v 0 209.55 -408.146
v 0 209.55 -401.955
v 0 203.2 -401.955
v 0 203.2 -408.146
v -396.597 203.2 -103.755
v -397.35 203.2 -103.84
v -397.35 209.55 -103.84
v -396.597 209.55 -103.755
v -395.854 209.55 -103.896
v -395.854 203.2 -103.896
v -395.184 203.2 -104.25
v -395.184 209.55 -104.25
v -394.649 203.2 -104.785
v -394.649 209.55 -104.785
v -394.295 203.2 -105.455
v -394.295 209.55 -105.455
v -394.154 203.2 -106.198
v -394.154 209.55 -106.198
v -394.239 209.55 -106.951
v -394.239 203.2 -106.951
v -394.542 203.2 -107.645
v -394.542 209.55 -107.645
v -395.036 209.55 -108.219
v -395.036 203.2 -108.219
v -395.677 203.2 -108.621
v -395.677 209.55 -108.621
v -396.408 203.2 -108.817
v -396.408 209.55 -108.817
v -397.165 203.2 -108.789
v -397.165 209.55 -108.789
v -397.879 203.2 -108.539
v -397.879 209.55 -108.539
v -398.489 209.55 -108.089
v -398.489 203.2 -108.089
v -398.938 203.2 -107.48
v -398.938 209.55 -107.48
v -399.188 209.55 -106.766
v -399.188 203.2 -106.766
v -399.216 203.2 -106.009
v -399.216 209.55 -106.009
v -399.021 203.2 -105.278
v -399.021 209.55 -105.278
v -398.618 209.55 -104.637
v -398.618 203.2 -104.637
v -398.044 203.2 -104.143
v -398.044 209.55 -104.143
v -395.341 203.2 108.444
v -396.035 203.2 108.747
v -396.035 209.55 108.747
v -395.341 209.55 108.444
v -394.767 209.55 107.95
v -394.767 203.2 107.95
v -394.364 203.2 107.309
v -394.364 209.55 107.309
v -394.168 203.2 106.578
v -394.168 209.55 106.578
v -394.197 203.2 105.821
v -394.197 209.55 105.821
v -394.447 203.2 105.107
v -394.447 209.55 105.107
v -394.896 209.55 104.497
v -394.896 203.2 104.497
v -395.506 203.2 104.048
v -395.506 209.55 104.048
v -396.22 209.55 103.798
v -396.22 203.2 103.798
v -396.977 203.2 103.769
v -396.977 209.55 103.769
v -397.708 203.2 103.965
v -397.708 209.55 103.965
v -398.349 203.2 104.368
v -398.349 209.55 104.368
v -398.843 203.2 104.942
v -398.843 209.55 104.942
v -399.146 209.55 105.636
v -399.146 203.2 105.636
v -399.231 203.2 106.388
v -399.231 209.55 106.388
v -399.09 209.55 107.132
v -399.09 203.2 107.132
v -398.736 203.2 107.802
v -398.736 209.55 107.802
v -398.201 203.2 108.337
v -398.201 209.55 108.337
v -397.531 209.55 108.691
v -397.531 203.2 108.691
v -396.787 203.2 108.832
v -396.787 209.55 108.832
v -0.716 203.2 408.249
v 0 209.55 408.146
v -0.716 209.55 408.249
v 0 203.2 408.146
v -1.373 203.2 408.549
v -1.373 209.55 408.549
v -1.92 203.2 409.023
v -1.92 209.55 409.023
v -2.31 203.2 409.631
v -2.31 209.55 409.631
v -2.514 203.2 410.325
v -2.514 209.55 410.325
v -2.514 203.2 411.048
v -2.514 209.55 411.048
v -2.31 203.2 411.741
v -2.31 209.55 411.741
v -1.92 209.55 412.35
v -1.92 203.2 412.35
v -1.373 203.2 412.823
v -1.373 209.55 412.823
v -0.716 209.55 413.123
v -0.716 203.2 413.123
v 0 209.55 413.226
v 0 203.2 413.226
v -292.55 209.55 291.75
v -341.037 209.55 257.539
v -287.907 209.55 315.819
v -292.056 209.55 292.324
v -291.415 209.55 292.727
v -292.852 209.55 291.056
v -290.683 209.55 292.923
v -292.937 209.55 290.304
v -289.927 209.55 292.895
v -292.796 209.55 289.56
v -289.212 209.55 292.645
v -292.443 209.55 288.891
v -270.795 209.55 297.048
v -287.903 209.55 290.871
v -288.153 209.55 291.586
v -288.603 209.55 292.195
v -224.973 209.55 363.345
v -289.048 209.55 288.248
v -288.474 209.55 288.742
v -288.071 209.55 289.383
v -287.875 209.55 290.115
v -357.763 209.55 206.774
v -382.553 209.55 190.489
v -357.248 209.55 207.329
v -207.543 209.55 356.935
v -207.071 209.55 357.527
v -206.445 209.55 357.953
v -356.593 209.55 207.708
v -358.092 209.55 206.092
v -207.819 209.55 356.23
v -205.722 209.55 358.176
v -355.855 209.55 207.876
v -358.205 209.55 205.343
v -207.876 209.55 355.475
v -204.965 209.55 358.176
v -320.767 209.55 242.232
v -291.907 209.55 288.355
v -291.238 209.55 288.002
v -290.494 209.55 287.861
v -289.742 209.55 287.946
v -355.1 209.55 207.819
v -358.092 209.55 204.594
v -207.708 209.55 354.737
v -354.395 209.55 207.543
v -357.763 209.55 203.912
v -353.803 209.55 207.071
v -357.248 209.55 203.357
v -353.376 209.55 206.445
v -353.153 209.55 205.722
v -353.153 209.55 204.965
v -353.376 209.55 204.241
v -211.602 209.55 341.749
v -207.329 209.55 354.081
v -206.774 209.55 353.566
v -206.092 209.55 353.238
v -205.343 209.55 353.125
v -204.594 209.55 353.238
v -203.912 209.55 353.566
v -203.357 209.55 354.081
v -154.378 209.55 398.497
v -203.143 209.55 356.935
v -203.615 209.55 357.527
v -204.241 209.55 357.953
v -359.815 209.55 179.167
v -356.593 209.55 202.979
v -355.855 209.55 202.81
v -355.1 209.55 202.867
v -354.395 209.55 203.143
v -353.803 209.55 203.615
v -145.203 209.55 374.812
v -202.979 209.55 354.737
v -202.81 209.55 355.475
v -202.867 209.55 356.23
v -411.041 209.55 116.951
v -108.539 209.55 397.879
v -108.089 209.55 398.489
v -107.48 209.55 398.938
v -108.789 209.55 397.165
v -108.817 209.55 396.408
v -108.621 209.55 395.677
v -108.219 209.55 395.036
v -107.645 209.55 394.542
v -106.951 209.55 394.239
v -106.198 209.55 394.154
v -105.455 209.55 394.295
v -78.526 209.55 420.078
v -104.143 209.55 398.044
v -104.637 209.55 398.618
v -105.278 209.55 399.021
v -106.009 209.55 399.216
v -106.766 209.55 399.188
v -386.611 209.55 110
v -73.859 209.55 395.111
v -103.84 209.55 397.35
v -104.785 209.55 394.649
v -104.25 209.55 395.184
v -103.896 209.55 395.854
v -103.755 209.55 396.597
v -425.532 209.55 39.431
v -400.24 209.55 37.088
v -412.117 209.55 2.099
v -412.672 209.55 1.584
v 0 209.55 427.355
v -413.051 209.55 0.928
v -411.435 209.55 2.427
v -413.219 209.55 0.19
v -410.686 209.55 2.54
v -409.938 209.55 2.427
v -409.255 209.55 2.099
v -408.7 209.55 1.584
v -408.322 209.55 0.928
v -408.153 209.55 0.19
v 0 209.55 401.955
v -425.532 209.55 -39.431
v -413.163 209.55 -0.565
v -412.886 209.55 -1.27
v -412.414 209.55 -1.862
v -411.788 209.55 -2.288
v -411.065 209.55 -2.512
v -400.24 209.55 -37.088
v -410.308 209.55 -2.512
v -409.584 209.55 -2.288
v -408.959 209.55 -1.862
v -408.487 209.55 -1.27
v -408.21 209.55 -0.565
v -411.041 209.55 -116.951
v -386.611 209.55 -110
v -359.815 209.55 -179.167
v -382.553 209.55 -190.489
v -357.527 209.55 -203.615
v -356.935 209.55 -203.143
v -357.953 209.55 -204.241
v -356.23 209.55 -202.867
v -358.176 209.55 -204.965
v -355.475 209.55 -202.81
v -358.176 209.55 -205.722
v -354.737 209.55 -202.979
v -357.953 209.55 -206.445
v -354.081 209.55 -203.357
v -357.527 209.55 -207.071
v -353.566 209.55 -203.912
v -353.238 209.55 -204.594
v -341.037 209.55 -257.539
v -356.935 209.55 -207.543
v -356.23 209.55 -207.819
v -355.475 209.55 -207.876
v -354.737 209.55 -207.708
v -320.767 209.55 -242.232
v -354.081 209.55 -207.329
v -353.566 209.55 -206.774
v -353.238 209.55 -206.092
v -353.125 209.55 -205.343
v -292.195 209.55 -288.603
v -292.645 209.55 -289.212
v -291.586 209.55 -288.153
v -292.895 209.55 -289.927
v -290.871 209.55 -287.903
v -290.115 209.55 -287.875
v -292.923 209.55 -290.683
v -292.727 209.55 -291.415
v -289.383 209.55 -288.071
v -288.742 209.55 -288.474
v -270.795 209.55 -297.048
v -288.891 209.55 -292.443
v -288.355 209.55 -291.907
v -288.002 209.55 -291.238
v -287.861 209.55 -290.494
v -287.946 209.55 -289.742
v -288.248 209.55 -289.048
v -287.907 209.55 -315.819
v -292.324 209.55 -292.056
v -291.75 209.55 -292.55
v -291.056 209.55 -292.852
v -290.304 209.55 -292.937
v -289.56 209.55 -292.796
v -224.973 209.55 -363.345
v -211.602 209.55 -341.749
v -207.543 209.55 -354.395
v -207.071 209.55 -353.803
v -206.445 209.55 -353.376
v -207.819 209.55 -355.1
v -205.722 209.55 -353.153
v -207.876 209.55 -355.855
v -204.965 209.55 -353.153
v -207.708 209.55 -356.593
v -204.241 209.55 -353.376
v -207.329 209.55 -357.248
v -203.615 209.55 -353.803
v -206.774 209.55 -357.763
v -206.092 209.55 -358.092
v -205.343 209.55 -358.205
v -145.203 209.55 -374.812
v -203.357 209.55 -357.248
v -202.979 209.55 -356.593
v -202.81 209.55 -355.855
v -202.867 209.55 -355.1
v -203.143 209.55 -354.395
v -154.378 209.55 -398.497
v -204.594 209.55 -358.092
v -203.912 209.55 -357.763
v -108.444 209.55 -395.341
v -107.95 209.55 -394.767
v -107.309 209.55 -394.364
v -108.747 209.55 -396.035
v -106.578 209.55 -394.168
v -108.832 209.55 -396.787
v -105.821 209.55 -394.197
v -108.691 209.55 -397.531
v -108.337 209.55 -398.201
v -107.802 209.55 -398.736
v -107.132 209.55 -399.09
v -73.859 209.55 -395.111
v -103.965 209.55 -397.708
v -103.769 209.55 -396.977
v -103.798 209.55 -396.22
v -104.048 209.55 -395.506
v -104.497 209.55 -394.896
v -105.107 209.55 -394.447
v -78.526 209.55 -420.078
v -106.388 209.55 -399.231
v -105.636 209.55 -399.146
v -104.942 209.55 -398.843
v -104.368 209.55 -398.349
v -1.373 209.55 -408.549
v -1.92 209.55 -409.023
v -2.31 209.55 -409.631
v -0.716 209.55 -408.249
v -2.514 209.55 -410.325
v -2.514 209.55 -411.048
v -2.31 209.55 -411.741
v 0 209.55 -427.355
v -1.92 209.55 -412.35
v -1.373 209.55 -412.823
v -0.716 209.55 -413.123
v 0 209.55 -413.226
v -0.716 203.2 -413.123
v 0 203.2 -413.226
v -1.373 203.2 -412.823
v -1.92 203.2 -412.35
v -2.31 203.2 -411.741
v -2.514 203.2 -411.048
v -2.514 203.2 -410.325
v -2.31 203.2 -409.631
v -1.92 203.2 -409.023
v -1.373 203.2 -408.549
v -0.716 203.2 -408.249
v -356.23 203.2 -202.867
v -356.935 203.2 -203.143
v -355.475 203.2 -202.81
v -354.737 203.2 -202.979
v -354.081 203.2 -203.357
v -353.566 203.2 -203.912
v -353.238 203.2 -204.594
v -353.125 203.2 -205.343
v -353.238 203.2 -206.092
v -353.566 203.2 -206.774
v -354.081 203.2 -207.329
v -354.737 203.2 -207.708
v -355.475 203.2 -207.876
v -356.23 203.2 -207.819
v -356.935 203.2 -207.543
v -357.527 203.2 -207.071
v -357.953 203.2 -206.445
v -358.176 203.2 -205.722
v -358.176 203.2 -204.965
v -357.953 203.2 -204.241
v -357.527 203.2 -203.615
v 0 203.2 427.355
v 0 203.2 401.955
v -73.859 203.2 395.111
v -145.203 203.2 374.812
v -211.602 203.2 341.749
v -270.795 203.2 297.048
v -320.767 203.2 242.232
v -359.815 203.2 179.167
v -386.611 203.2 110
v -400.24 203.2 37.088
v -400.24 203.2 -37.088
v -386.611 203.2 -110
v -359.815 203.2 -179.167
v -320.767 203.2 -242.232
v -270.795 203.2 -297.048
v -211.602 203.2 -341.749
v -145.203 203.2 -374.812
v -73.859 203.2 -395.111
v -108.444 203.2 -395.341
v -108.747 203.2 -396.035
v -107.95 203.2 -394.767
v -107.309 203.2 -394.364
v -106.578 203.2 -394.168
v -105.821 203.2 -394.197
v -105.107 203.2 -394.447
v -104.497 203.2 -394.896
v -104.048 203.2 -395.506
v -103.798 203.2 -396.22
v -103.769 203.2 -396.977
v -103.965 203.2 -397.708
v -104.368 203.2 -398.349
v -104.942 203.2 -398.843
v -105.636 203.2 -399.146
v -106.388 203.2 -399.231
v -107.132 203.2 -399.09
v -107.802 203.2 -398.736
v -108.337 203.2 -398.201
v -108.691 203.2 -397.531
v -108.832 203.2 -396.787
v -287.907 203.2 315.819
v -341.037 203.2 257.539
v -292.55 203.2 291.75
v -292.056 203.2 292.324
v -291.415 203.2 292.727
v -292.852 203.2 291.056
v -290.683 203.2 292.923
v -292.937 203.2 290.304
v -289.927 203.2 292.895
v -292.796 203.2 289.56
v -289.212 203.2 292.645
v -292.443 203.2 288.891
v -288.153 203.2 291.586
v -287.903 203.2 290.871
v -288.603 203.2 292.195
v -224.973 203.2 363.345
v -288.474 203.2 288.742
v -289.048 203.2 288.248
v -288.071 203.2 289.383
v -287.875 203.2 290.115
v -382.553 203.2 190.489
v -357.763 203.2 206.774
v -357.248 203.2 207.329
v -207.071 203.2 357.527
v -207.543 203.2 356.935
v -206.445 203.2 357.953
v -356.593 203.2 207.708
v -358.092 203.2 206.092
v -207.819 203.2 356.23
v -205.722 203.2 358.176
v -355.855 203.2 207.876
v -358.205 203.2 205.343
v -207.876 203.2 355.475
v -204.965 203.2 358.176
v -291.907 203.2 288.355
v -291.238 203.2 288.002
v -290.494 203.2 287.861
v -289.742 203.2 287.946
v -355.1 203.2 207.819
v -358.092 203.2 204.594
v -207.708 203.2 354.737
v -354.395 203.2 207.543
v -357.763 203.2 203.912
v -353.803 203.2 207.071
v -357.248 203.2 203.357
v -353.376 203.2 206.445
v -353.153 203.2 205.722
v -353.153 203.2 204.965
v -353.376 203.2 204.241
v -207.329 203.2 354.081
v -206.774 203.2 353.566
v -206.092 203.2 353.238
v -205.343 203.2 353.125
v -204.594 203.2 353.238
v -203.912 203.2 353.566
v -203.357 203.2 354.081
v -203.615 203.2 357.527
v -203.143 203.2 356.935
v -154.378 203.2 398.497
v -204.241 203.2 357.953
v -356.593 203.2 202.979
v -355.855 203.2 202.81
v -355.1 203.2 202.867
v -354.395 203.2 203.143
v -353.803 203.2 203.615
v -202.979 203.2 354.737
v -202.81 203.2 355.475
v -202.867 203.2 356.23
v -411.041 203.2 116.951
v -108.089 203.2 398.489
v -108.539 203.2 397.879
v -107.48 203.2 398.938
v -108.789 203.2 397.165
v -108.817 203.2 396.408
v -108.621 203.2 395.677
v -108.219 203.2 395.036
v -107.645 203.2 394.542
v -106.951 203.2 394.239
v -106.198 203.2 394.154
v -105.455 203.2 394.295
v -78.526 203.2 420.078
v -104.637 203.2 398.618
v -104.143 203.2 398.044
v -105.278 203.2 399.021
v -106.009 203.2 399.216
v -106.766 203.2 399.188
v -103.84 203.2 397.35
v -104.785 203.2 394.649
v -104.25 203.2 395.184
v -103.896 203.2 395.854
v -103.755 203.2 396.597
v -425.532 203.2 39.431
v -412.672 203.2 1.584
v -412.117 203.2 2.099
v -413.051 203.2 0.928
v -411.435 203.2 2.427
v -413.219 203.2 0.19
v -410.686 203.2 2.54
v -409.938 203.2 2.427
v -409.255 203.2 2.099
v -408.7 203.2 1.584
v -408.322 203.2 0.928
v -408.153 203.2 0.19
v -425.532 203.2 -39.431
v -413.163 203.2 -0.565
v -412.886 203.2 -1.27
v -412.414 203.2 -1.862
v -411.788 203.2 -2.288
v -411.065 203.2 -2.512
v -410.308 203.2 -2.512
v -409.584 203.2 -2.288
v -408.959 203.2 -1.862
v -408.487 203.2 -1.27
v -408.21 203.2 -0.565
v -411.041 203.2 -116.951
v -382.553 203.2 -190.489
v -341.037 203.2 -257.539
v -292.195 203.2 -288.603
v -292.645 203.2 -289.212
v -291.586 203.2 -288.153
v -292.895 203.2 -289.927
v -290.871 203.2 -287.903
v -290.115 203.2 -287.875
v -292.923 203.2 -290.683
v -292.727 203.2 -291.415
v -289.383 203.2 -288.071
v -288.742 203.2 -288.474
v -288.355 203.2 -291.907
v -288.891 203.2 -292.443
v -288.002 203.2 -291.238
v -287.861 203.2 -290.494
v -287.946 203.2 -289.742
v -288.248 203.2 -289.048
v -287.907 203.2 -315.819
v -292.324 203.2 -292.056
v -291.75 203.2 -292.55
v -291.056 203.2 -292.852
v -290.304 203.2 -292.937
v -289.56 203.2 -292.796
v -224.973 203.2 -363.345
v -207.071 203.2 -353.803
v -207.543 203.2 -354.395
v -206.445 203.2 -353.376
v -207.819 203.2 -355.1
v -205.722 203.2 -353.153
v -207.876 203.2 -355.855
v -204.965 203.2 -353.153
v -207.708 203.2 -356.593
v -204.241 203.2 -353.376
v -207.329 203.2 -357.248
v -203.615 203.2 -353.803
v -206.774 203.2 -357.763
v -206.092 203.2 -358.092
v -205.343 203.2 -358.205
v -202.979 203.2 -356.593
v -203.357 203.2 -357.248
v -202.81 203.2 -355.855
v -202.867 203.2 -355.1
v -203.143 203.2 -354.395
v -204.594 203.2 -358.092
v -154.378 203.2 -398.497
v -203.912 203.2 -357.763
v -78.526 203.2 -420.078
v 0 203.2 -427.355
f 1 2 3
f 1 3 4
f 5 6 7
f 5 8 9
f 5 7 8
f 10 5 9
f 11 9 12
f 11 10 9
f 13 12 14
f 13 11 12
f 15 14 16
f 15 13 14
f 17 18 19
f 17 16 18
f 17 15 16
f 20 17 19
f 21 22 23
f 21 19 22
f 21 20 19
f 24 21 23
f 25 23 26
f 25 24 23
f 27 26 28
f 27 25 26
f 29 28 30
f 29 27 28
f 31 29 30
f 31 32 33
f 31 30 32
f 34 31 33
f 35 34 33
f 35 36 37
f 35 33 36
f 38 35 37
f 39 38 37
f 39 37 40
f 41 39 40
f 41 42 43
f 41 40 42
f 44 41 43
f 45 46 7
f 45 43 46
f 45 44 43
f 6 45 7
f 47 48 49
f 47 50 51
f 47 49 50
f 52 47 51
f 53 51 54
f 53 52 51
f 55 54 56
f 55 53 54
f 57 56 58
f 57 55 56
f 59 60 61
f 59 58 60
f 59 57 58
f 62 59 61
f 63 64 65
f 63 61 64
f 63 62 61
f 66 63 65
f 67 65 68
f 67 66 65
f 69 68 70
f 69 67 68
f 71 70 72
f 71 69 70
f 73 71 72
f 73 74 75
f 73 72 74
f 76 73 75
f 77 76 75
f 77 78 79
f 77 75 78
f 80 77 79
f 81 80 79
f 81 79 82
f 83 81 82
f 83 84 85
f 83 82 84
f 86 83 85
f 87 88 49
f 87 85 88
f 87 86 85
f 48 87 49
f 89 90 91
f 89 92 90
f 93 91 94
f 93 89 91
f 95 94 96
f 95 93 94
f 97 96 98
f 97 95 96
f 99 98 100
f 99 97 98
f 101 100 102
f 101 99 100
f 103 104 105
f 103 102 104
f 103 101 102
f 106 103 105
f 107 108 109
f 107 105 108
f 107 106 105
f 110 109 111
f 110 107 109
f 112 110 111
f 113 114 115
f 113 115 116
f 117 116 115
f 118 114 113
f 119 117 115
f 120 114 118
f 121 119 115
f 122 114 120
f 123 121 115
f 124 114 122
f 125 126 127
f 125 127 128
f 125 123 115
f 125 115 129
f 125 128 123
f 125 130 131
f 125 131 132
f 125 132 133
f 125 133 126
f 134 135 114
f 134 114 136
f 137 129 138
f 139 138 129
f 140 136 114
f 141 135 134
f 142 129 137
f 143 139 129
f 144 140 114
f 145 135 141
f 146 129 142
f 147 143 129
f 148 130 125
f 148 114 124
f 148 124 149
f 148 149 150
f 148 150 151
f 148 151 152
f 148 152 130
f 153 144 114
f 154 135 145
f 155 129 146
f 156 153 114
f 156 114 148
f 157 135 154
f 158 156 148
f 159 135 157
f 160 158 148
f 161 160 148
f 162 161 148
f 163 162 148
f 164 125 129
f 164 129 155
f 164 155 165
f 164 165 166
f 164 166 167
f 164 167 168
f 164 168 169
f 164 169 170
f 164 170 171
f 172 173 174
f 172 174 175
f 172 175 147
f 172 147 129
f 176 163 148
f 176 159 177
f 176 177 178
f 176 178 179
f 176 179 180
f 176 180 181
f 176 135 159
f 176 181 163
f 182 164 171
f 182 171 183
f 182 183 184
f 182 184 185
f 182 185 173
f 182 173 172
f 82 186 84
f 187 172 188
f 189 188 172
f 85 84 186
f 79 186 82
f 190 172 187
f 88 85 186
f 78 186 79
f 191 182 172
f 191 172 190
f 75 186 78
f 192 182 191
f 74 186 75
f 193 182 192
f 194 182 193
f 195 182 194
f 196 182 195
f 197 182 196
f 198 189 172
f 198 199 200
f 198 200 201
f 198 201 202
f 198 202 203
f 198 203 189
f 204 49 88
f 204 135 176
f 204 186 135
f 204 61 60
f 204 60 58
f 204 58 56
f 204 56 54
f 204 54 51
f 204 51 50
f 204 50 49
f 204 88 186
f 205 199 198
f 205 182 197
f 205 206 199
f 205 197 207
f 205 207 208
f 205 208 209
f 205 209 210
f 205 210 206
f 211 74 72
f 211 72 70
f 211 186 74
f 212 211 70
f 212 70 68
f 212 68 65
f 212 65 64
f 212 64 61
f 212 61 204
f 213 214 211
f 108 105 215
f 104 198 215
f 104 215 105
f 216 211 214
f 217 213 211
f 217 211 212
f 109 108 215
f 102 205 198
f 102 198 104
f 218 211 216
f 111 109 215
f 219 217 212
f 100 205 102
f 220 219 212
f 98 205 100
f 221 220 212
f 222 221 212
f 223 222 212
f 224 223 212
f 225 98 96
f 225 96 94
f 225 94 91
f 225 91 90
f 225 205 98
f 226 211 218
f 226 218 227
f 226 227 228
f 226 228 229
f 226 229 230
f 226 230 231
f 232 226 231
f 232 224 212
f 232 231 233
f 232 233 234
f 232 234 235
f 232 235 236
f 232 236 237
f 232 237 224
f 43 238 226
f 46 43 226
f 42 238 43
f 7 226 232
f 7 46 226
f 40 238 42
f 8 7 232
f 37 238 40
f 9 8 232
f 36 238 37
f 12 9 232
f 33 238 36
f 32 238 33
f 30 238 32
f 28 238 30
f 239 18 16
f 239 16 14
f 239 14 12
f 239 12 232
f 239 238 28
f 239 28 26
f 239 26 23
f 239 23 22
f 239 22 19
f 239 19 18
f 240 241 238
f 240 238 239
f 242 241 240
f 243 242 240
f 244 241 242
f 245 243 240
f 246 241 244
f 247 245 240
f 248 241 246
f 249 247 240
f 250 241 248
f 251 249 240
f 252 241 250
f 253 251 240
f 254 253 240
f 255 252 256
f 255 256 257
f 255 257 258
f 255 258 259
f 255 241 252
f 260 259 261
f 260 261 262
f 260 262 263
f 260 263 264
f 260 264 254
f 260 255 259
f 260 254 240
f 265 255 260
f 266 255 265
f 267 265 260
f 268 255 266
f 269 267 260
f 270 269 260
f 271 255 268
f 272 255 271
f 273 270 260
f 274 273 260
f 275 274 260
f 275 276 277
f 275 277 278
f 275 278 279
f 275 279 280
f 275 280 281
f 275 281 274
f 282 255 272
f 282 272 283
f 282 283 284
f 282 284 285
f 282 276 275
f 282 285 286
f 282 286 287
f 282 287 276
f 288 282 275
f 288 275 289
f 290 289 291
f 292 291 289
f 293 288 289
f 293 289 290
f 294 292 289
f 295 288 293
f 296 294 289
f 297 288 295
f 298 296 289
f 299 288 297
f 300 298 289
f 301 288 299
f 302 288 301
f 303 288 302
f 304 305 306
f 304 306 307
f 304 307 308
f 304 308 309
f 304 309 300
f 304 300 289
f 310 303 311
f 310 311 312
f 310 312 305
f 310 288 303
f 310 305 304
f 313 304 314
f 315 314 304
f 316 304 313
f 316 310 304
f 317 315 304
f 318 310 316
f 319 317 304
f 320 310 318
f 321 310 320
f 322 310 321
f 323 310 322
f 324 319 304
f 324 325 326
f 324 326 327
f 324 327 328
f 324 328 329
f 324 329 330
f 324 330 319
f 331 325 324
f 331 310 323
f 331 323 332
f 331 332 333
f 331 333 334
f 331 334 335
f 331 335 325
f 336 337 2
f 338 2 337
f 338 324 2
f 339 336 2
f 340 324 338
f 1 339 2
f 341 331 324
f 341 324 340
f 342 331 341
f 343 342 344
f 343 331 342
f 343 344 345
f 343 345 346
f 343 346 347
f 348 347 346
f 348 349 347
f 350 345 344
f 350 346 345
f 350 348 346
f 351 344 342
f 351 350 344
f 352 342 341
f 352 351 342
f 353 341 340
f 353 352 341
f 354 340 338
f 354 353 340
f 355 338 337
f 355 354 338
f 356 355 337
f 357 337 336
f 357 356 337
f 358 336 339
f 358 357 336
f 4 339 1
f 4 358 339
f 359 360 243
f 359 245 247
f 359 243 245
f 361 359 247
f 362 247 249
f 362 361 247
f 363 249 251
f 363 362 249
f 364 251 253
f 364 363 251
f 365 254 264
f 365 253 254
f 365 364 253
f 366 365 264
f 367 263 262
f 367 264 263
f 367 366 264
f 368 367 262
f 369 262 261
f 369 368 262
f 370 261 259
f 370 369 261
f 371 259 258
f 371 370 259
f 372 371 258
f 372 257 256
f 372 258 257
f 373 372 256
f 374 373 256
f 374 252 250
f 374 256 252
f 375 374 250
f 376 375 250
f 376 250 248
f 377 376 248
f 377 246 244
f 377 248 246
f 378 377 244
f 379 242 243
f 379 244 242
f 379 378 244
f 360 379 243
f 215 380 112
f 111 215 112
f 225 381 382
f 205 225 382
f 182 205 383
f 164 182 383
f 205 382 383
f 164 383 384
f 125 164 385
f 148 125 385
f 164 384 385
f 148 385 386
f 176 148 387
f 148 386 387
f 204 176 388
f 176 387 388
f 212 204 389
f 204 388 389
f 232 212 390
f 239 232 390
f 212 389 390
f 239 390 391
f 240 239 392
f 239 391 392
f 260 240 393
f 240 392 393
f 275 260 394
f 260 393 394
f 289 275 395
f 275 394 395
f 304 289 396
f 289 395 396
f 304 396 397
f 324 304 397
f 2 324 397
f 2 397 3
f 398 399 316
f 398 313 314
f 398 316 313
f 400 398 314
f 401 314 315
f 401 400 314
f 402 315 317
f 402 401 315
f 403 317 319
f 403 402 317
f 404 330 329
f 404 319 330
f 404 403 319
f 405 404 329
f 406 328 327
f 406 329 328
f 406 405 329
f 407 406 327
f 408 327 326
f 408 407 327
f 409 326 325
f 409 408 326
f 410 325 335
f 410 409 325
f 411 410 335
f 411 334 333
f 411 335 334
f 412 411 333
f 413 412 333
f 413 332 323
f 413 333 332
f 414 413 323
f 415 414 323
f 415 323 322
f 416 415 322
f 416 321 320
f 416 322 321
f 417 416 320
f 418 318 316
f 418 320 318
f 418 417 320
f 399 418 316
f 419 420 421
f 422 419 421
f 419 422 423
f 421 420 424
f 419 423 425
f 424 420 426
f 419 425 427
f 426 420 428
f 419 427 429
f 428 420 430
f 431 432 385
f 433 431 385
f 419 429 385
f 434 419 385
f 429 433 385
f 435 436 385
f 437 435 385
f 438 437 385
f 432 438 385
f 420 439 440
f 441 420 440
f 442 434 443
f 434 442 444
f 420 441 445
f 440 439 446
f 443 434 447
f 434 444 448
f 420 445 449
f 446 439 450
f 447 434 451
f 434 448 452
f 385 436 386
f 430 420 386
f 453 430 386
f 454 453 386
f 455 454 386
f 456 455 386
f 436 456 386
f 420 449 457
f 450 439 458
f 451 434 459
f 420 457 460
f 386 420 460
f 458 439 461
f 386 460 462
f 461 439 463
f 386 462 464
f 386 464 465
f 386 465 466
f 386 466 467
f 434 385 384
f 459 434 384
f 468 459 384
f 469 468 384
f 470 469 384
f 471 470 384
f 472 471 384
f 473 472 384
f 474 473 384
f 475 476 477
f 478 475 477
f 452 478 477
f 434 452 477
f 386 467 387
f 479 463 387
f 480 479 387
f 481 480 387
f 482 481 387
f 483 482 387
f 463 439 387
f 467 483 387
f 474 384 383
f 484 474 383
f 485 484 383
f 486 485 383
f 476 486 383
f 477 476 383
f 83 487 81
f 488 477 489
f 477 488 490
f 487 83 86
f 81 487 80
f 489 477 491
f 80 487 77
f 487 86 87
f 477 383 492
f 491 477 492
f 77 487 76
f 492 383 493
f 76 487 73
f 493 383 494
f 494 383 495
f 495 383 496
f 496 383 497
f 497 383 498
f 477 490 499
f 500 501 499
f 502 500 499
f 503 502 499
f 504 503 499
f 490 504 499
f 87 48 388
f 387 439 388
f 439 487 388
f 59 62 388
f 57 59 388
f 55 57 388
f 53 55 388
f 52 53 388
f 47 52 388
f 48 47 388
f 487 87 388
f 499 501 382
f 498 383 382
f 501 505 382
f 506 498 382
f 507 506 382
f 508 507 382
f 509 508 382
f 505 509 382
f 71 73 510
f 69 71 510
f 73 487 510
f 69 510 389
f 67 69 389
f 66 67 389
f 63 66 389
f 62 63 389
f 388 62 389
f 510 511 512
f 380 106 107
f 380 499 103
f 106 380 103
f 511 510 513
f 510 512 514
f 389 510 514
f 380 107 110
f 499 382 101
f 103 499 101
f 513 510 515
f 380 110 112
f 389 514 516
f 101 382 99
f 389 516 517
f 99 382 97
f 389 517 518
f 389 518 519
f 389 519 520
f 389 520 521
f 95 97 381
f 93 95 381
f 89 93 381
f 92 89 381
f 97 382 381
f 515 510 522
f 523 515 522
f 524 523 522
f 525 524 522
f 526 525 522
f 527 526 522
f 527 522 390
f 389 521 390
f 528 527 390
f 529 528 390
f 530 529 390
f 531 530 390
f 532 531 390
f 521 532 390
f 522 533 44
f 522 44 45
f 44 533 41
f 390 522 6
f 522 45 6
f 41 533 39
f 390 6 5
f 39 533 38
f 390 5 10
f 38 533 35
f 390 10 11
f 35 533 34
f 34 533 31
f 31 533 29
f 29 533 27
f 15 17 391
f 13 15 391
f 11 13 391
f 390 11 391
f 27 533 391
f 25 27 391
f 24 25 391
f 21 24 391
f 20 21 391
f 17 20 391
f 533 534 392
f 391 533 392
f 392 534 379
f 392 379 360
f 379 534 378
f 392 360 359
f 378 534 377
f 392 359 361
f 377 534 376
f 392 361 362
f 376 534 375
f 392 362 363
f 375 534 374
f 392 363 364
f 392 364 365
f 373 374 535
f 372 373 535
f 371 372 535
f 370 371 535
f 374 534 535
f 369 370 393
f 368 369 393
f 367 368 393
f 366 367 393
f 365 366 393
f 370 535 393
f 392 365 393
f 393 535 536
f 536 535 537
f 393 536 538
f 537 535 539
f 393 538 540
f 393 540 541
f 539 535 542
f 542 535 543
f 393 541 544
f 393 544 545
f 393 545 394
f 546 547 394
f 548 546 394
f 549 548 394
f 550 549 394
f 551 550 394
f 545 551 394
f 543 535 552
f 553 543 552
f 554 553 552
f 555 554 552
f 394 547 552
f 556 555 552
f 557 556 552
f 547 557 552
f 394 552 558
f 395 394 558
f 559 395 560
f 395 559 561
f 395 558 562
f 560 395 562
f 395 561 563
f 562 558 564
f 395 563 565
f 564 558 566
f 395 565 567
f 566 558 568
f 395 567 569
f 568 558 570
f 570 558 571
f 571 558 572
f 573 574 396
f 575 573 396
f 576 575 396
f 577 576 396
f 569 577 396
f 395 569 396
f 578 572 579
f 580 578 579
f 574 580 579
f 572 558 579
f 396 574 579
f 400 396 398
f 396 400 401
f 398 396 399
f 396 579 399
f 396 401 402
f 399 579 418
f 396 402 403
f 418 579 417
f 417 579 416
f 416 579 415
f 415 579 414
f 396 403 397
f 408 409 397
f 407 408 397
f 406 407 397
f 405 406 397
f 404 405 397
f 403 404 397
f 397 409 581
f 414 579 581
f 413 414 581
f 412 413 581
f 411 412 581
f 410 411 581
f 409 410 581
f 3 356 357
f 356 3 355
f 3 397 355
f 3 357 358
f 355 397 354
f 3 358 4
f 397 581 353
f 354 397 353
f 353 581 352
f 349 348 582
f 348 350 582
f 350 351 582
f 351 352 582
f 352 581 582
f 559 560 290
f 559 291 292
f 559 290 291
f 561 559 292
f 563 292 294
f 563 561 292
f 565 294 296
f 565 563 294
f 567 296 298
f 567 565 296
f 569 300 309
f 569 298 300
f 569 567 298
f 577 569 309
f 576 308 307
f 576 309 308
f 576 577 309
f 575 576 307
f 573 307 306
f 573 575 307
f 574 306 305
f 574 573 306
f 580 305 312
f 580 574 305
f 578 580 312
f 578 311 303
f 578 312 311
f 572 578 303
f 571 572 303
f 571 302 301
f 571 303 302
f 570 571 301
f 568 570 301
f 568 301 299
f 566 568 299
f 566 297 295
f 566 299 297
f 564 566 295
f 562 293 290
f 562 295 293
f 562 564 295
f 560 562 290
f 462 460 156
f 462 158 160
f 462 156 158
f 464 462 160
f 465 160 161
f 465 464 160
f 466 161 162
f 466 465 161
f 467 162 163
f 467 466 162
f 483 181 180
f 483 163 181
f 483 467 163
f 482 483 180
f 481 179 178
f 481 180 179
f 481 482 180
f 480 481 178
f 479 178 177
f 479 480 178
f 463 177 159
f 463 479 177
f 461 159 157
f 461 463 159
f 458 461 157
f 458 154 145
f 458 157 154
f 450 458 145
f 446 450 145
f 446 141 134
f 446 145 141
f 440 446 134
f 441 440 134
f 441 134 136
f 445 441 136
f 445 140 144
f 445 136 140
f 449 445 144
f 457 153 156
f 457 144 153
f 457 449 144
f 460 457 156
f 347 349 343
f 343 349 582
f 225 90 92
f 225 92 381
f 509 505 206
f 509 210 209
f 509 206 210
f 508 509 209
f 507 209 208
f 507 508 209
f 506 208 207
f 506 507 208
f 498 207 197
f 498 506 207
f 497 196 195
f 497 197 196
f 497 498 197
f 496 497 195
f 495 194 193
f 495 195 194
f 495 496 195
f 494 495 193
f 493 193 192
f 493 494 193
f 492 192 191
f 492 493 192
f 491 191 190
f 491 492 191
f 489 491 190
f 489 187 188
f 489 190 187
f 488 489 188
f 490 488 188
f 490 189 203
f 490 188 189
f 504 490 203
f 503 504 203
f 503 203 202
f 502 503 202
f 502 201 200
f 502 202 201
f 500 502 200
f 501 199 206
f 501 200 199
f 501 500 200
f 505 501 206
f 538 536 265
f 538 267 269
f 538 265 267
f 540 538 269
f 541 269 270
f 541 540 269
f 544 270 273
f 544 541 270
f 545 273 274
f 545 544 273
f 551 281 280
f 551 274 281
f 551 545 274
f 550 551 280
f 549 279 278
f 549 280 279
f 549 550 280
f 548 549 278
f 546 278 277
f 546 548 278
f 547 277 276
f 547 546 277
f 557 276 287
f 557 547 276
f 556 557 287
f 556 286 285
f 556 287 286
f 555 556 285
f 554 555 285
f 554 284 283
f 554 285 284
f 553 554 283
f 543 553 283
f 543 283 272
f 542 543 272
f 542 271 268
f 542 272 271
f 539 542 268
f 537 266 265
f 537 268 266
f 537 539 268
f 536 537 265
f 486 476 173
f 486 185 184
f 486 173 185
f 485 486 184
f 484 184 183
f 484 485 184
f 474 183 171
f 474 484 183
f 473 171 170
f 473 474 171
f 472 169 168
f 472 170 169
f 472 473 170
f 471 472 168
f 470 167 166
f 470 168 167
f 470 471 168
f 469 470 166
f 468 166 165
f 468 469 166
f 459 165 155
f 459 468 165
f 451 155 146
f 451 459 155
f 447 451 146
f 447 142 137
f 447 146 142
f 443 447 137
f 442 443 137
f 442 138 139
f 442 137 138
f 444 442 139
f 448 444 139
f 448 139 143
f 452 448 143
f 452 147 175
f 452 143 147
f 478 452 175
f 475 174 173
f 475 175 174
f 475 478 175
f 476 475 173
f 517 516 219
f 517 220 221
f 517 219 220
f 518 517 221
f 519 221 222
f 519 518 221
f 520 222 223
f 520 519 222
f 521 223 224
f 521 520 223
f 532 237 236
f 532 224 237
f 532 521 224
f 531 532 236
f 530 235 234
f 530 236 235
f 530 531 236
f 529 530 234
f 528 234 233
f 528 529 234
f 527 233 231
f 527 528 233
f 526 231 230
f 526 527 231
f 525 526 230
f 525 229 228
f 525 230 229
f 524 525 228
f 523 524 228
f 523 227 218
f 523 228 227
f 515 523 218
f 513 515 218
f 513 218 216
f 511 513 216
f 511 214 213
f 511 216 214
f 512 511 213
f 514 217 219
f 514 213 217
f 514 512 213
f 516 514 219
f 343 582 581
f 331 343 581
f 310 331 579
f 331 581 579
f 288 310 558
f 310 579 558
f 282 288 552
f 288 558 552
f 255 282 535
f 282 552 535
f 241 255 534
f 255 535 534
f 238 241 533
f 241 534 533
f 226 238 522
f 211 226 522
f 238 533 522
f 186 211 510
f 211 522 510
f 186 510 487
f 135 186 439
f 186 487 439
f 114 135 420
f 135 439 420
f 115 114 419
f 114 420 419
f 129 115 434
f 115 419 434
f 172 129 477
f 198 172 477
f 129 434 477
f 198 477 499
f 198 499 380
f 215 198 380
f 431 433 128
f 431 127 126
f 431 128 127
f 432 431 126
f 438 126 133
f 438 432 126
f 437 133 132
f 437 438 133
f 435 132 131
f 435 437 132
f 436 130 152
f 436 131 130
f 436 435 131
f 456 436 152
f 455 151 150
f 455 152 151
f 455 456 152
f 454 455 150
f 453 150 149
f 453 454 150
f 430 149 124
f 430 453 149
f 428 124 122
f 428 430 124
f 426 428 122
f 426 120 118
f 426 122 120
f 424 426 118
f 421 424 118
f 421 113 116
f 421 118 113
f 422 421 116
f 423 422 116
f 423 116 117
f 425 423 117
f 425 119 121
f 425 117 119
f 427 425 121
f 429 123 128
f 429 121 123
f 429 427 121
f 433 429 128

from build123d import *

# Parameters (mm, degrees)
BOSS_EXTRUDE1_START     = -317.5
SKETCH4_R               = 2.54
SKETCH4_R_2             = 9.525
SKETCH4_R_3             = 14.2875
BOSS_EXTRUDE1_DEPTH     = 3.175
BOSS_EXTRUDE2_DEPTH     = 3.175
BOSS_EXTRUDE3_START     = -76.2
BOSS_EXTRUDE3_DEPTH     = 3.175
SKETCH9_R               = 2.54
CUT_EXTRUDE2_DEPTH      = 506.024067921
LPATTERN1_COUNT         = 10
LPATTERN1_PITCH         = 50.8
BOSS_EXTRUDE4_START     = 12.7
SKETCH10_R              = 2.54
BOSS_EXTRUDE4_DEPTH     = 12.7
CUT_EXTRUDE3_START      = -76.2
SKETCH11_W              = 25.4
SKETCH11_H              = 725.706439768
SKETCH11_R              = 2.54
SKETCH11_W_2            = 44.268323152
CUT_EXTRUDE3_DEPTH      = 76.2
SKETCH17_R              = 2.54
CUT_EXTRUDE7_DEPTH      = 641.418199343
CIRPATTERN1_COUNT       = 15
CIRPATTERN1_ANGLE       = 210
BOSS_EXTRUDE6_START     = 25.4
SKETCH18_R              = 482.6
SKETCH18_R_2            = 444.5
BOSS_EXTRUDE6_DEPTH     = 38.1
BOSS_EXTRUDE7_START     = 101.6
BOSS_EXTRUDE7_DEPTH     = 6.35
SKETCH17_2_R            = 2.54
CUT_EXTRUDE8_DEPTH      = 691.983880058
CIRPATTERN2_COUNT       = 15
CIRPATTERN2_ANGLE       = 210
CUT_EXTRUDE9_DEPTH      = 50.8
CUT_EXTRUDE9_DEPTH_BACK = 691.983880058
SKETCH21_R              = 848.891258833
SKETCH25_R              = 608.013624822
CUT_EXTRUDE12_DEPTH     = 127


with BuildPart() as part:
    # Sketch4 → Boss-Extrude1 (new body)
    with BuildSketch(Plane(origin=(0, 0, 0), x_dir=(0, 0, -1), z_dir=(1, 0, 0)).offset(BOSS_EXTRUDE1_START)):
        with BuildLine():
            Line((362.853219884, 88.9), (0, 88.9))
            Line((0, 88.9), (0, 65.0875))
            ThreePointArc((0, 65.0875), (14.2875, 50.8), (0, 36.5125))
            Line((0, 36.5125), (0, 12.7))
            Line((0, 12.7), (362.853219884, 12.7))
            Line((362.853219884, 12.7), (362.853219884, 88.9))
        make_face()
        with Locations((53.34, 25.4)):
            Circle(SKETCH4_R, mode=Mode.SUBTRACT)
        with Locations((53.34, 50.8)):
            Circle(SKETCH4_R_2, mode=Mode.SUBTRACT)
        with Locations((177.45964, 50.8)):
            Circle(SKETCH4_R_3, mode=Mode.SUBTRACT)
        with Locations((53.34, 76.2)):
            Circle(SKETCH4_R, mode=Mode.SUBTRACT)
        with Locations((337.453219884, 53.975)):
            Circle(SKETCH4_R_3, mode=Mode.SUBTRACT)
    extrude(amount=-BOSS_EXTRUDE1_DEPTH)

    # Sketch7 → Boss-Extrude2 (add)
    with BuildSketch(Plane(origin=(0, 88.9, 0), x_dir=(1, 0, 0), z_dir=(0, 1, 0))):
        Polygon((-319.0875, 0), (-342.9, 0), (-342.9, 362.853219884), (-317.5, 362.853219884), align=None)
    extrude(amount=-BOSS_EXTRUDE2_DEPTH)

    # Sketch7<2> → Boss-Extrude3 (add)
    with BuildSketch(Plane(origin=(0, 88.9, 0), x_dir=(1, 0, 0), z_dir=(0, 1, 0)).offset(BOSS_EXTRUDE3_START)):
        Polygon((-319.0875, 0), (-342.9, 0), (-342.9, 362.853219884), (-317.5, 362.853219884), align=None)
    extrude(amount=BOSS_EXTRUDE3_DEPTH)

    # Sketch9 → Cut-Extrude2 (cut, through all)
    with BuildSketch(Plane(origin=(0, 88.9, 0), x_dir=(1, 0, 0), z_dir=(0, 1, 0))):
        with Locations(Location((-330.2, 355.6, 0), (0, 0, 270))):
            Circle(SKETCH9_R)
    cut_extrude2 = extrude(amount=-CUT_EXTRUDE2_DEPTH, mode=Mode.SUBTRACT)

    # LPattern1: Cut-Extrude2 ×10
    with Locations(*[(0, 0, i * LPATTERN1_PITCH) for i in range(1, LPATTERN1_COUNT)]):
        add(cut_extrude2, mode=Mode.SUBTRACT)

    # Mirror1: part across face


with BuildPart() as part_1:
    add(part.part)
    add(part.part.mirror(Plane(origin=(-320.239664948, 22.265914948, 0), x_dir=(1, 0, 0), z_dir=(0, 0, 1))))

    # Sketch10 → Boss-Extrude4 (add)
    with BuildSketch(Plane(origin=(0, 88.9, 0), x_dir=(1, 0, 0), z_dir=(0, 1, 0)).offset(BOSS_EXTRUDE4_START)):
        with BuildLine():
            Line((0, -452.755), (0, 452.755))
            ThreePointArc((0, 452.755), (-233.269031744, 388.03691687), (-399.849790193, 212.38464))
            Line((-399.849790193, 212.38464), (-381, 212.38464))
            Line((-381, 212.38464), (-381, 142.53464))
            Line((-381, 142.53464), (-419.1, 142.53464))
            Line((-419.1, 142.53464), (-419.1, 171.295884437))
            ThreePointArc((-419.1, 171.295884437), (-452.755, 0), (-419.1, -171.295884437))
            Line((-419.1, -171.295884437), (-419.1, -142.53464))
            Line((-419.1, -142.53464), (-381, -142.53464))
            Line((-381, -142.53464), (-381, -212.38464))
            Line((-381, -212.38464), (-399.849790193, -212.38464))
            ThreePointArc((-399.849790193, -212.38464), (-356.378451147, -279.251659947), (-301.848330151, -337.453219884))
            ThreePointArc((-301.848330151, -337.453219884), (-161.560294405, -422.948414463), (0, -452.755))
        make_face()
        with Locations(Location((-330.2, -304.8, 0), (0, 0, 90))):
            Circle(SKETCH10_R, mode=Mode.SUBTRACT)
        with Locations(Location((-330.2, -254, 0), (0, 0, 90))):
            Circle(SKETCH10_R, mode=Mode.SUBTRACT)
        with Locations(Location((-330.2, -203.2, 0), (0, 0, 90))):
            Circle(SKETCH10_R, mode=Mode.SUBTRACT)
        with Locations(Location((-330.2, -152.4, 0), (0, 0, 90))):
            Circle(SKETCH10_R, mode=Mode.SUBTRACT)
        with Locations(Location((-330.2, -101.6, 0), (0, 0, 90))):
            Circle(SKETCH10_R, mode=Mode.SUBTRACT)
        with Locations(Location((-330.2, -50.8, 0), (0, 0, 90))):
            Circle(SKETCH10_R, mode=Mode.SUBTRACT)
        with Locations(Location((-330.2, 0, 0), (0, 0, 270))):
            Circle(SKETCH10_R, mode=Mode.SUBTRACT)
        with Locations(Location((-330.2, 50.8, 0), (0, 0, 270))):
            Circle(SKETCH10_R, mode=Mode.SUBTRACT)
        with Locations(Location((-330.2, 101.6, 0), (0, 0, 270))):
            Circle(SKETCH10_R, mode=Mode.SUBTRACT)
        with Locations(Location((-330.2, 152.4, 0), (0, 0, 270))):
            Circle(SKETCH10_R, mode=Mode.SUBTRACT)
        with Locations(Location((-330.2, 203.2, 0), (0, 0, 270))):
            Circle(SKETCH10_R, mode=Mode.SUBTRACT)
        with Locations(Location((-330.2, 254, 0), (0, 0, 270))):
            Circle(SKETCH10_R, mode=Mode.SUBTRACT)
        with Locations(Location((-330.2, 304.8, 0), (0, 0, 270))):
            Circle(SKETCH10_R, mode=Mode.SUBTRACT)
        with Locations(Location((-441.325, 88.9, 0), (0, 0, 270))):
            Circle(SKETCH10_R, mode=Mode.SUBTRACT)
        with Locations(Location((-441.325, 0, 0), (0, 0, 270))):
            Circle(SKETCH10_R, mode=Mode.SUBTRACT)
        with Locations(Location((-441.325, -88.9, 0), (0, 0, 270))):
            Circle(SKETCH10_R, mode=Mode.SUBTRACT)
    extrude(amount=-BOSS_EXTRUDE4_DEPTH)

    # Sketch11 → Cut-Extrude3 (cut)
    # profile 1 of 2: a face of its own
    with BuildSketch(Plane.XZ.offset(-12.7).offset(CUT_EXTRUDE3_START)):
        with Locations((-330.2, 0)):
            Rectangle(SKETCH11_W, SKETCH11_H)
        with Locations(Location((-330.2, -203.2, 0), (0, 0, 90))):
            Circle(SKETCH11_R, mode=Mode.SUBTRACT)
        with Locations(Location((-330.2, -101.6, 0), (0, 0, 90))):
            Circle(SKETCH11_R, mode=Mode.SUBTRACT)
        with Locations(Location((-330.2, -304.8, 0), (0, 0, 90))):
            Circle(SKETCH11_R, mode=Mode.SUBTRACT)
        with Locations(Location((-330.2, 203.2, 0), (0, 0, 270))):
            Circle(SKETCH11_R, mode=Mode.SUBTRACT)
        with Locations(Location((-330.2, 101.6, 0), (0, 0, 90))):
            Circle(SKETCH11_R, mode=Mode.SUBTRACT)
        with Locations(Location((-330.2, 304.8, 0), (0, 0, 270))):
            Circle(SKETCH11_R, mode=Mode.SUBTRACT)
        with Locations((-330.2, 355.6)):
            Circle(SKETCH11_R, mode=Mode.SUBTRACT)
        with Locations(Location((-330.2, 50.8, 0), (0, 0, 90))):
            Circle(SKETCH11_R, mode=Mode.SUBTRACT)
        with Locations(Location((-330.2, 152.4, 0), (0, 0, 90))):
            Circle(SKETCH11_R, mode=Mode.SUBTRACT)
        with Locations(Location((-330.2, 254, 0), (0, 0, 270))):
            Circle(SKETCH11_R, mode=Mode.SUBTRACT)
        with Locations((-330.2, -355.6)):
            Circle(SKETCH11_R, mode=Mode.SUBTRACT)
        with Locations(Location((-330.2, -50.8, 0), (0, 0, 90))):
            Circle(SKETCH11_R, mode=Mode.SUBTRACT)
        with Locations(Location((-330.2, -152.4, 0), (0, 0, 90))):
            Circle(SKETCH11_R, mode=Mode.SUBTRACT)
        with Locations(Location((-330.2, -254, 0), (0, 0, 90))):
            Circle(SKETCH11_R, mode=Mode.SUBTRACT)
    # profile 2 of 2: a face of its own
    with BuildSketch(Plane.XZ.offset(-12.7).offset(CUT_EXTRUDE3_START)):
        with Locations((-365.034161576, 0)):
            Rectangle(SKETCH11_W_2, SKETCH11_H)
    extrude(amount=CUT_EXTRUDE3_DEPTH, mode=Mode.SUBTRACT)

    # Sketch17 → Cut-Extrude7 (cut, through all)
    with BuildSketch(Plane(origin=(0, 101.6, 0), x_dir=(1, 0, 0), z_dir=(0, 1, 0))):
        with Locations((0, -410.68625)):
            Circle(SKETCH17_R)
    cut_extrude7 = extrude(amount=-CUT_EXTRUDE7_DEPTH, mode=Mode.SUBTRACT)

    # CirPattern1: Cut-Extrude7 ×15 about axis
    cirpattern1_axis = Axis((0, 0, 0), (0, -1, 0))
    for i in range(1, CIRPATTERN1_COUNT):
        add(cut_extrude7.rotate(cirpattern1_axis, i * CIRPATTERN1_ANGLE / (CIRPATTERN1_COUNT - 1)), mode=Mode.SUBTRACT)

    # Sketch21 → Cut-Extrude9 (cut, two sides: drawn at the far end of the back side and taken through both)
    with BuildSketch(Plane(origin=(0, 101.6, 0), x_dir=(1, 0, 0), z_dir=(0, 1, 0)).offset(-CUT_EXTRUDE9_DEPTH_BACK)):
        Circle(SKETCH21_R)
    extrude(amount=CUT_EXTRUDE9_DEPTH + CUT_EXTRUDE9_DEPTH_BACK, mode=Mode.SUBTRACT)


with BuildPart() as body_2:
    # Sketch18 → Boss-Extrude6 (new body)
    with BuildSketch(Plane(origin=(0, 101.6, 0), x_dir=(1, 0, 0), z_dir=(0, 1, 0)).offset(BOSS_EXTRUDE6_START)):
        with Locations(Location((0, 0, 0), (0, 0, 90))):
            Circle(SKETCH18_R)
        with Locations(Location((0, 0, 0), (0, 0, 90))):
            Circle(SKETCH18_R_2, mode=Mode.SUBTRACT)
    extrude(amount=BOSS_EXTRUDE6_DEPTH)

    # Sketch25 → Cut-Extrude12 (cut)
    with BuildSketch(Plane(origin=(0, 165.1, 0), x_dir=(1, 0, 0), z_dir=(0, 1, 0))):
        Circle(SKETCH25_R)
    extrude(amount=-CUT_EXTRUDE12_DEPTH, mode=Mode.SUBTRACT)


with BuildPart() as body_3:
    # Sketch19 → Boss-Extrude7 (new body)
    with BuildSketch(Plane(origin=(0, 101.6, 0), x_dir=(1, 0, 0), z_dir=(0, 1, 0)).offset(BOSS_EXTRUDE7_START)):
        with BuildLine():
            Line((0, -427.355), (0, -401.955))
            ThreePointArc((0, -401.955), (-401.955, 0), (0, 401.955))
            Line((0, 401.955), (0, 427.355))
            ThreePointArc((0, 427.355), (-427.355, 0), (0, -427.355))
        make_face()
    extrude(amount=BOSS_EXTRUDE7_DEPTH)

    # Sketch17<2> → Cut-Extrude8 (cut, through all)
    with BuildSketch(Plane(origin=(0, 101.6, 0), x_dir=(1, 0, 0), z_dir=(0, 1, 0))):
        with Locations((0, -410.68625)):
            Circle(SKETCH17_2_R)
    cut_extrude8 = extrude(amount=CUT_EXTRUDE8_DEPTH, mode=Mode.SUBTRACT)

    # CirPattern2: Cut-Extrude8 ×15 about axis
    cirpattern2_axis = Axis((0, 0, 0), (0, -1, 0))
    for i in range(1, CIRPATTERN2_COUNT):
        add(cut_extrude8.rotate(cirpattern2_axis, i * CIRPATTERN2_ANGLE / (CIRPATTERN2_COUNT - 1)), mode=Mode.SUBTRACT)


solid = body_3.part
